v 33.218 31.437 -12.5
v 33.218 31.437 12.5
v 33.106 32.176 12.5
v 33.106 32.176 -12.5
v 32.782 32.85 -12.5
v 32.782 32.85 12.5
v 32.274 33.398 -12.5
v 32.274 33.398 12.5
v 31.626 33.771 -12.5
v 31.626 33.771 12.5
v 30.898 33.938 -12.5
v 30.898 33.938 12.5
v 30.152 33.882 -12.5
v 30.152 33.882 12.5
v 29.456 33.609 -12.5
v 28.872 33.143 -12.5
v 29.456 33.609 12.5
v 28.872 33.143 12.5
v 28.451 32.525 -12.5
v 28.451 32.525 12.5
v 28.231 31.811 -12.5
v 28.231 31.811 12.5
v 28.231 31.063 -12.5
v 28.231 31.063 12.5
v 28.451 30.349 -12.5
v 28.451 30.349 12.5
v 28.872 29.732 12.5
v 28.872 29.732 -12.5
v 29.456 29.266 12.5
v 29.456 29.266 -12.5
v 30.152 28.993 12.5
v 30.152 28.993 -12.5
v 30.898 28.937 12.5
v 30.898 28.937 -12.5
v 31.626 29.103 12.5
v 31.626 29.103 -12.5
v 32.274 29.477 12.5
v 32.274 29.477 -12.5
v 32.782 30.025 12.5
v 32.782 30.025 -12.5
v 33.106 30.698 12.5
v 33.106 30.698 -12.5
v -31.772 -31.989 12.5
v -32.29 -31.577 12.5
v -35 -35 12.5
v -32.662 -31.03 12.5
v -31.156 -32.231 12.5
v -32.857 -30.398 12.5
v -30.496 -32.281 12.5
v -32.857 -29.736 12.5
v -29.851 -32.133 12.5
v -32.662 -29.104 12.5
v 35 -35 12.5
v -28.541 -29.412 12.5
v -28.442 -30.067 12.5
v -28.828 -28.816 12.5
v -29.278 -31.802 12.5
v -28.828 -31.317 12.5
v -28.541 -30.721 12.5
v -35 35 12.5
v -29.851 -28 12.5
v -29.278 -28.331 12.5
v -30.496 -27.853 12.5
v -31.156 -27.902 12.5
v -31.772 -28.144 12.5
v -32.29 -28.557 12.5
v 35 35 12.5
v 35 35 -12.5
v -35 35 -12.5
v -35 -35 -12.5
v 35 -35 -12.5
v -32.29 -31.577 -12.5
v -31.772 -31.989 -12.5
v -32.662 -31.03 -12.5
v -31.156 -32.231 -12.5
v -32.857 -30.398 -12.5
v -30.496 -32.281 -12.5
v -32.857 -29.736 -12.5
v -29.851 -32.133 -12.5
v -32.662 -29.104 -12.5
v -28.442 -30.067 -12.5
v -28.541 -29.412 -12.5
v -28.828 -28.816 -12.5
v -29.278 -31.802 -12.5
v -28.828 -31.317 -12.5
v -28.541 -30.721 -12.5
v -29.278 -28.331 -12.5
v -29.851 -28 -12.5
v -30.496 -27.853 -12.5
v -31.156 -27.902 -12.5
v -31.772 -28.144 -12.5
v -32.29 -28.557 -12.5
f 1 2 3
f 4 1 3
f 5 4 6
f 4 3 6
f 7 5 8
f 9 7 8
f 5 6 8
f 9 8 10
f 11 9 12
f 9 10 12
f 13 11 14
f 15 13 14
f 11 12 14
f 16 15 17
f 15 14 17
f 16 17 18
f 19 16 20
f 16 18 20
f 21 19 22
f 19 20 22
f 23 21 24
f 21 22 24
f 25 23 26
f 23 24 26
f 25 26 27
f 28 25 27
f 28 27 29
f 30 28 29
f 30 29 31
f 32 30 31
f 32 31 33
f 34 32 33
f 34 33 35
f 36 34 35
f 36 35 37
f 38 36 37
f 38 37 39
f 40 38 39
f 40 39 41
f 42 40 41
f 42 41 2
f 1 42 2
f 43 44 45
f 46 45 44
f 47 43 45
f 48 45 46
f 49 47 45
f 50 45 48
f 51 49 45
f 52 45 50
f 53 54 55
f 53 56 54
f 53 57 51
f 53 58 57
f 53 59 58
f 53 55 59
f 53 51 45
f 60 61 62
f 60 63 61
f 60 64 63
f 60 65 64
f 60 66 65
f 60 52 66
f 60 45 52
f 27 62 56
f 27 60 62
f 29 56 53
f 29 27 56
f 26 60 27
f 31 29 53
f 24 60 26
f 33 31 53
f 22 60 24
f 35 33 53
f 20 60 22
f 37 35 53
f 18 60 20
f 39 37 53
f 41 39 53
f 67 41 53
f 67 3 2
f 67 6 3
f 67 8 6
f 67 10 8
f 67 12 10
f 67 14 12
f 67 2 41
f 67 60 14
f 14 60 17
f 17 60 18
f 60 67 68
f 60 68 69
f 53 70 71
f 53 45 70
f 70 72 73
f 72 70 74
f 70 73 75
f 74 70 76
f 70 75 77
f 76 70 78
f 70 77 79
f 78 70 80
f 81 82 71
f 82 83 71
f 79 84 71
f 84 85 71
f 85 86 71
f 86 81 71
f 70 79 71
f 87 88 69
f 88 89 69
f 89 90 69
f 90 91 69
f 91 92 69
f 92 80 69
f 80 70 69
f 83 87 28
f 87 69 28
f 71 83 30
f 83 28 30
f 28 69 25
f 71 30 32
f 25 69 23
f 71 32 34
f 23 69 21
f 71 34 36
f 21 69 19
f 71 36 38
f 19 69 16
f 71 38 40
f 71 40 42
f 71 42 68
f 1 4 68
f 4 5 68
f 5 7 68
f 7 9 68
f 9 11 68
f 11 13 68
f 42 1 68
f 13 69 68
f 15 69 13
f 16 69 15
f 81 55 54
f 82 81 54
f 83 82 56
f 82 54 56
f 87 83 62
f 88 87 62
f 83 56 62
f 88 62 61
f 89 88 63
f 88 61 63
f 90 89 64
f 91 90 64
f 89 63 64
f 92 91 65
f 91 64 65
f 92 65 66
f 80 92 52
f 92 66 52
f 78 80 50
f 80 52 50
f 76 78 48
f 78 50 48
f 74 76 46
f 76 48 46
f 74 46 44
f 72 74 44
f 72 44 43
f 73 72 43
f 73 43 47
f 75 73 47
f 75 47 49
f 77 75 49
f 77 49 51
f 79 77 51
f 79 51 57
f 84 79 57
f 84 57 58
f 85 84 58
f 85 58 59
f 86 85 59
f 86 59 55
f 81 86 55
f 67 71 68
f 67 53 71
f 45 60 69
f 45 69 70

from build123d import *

# Parameters (mm, degrees)
F1_DEPTH = 12.5
F2_R     = 2.219966
F2_R_2   = 2.507517
F3_DEPTH = 26


with BuildPart() as f1:
    # F0 (on Top) → F1 (new body, symmetric)
    with BuildSketch(Plane.XY):
        Polygon((35, -35), (35, 35), (-35, 35), align=None)
        Polygon((35, -35), (-35, 35), (-35, -35), align=None)
    extrude(amount=F1_DEPTH, both=True)

    # F2 (on face) → F3 (cut)
    with BuildSketch(Plane.XY.offset(12.5)):
        with Locations((-30.662185, -30.06679)):
            Circle(F2_R)
        with Locations((30.71014, 31.437151)):
            Circle(F2_R_2)
    extrude(amount=-F3_DEPTH, mode=Mode.SUBTRACT)


solid = f1.part
